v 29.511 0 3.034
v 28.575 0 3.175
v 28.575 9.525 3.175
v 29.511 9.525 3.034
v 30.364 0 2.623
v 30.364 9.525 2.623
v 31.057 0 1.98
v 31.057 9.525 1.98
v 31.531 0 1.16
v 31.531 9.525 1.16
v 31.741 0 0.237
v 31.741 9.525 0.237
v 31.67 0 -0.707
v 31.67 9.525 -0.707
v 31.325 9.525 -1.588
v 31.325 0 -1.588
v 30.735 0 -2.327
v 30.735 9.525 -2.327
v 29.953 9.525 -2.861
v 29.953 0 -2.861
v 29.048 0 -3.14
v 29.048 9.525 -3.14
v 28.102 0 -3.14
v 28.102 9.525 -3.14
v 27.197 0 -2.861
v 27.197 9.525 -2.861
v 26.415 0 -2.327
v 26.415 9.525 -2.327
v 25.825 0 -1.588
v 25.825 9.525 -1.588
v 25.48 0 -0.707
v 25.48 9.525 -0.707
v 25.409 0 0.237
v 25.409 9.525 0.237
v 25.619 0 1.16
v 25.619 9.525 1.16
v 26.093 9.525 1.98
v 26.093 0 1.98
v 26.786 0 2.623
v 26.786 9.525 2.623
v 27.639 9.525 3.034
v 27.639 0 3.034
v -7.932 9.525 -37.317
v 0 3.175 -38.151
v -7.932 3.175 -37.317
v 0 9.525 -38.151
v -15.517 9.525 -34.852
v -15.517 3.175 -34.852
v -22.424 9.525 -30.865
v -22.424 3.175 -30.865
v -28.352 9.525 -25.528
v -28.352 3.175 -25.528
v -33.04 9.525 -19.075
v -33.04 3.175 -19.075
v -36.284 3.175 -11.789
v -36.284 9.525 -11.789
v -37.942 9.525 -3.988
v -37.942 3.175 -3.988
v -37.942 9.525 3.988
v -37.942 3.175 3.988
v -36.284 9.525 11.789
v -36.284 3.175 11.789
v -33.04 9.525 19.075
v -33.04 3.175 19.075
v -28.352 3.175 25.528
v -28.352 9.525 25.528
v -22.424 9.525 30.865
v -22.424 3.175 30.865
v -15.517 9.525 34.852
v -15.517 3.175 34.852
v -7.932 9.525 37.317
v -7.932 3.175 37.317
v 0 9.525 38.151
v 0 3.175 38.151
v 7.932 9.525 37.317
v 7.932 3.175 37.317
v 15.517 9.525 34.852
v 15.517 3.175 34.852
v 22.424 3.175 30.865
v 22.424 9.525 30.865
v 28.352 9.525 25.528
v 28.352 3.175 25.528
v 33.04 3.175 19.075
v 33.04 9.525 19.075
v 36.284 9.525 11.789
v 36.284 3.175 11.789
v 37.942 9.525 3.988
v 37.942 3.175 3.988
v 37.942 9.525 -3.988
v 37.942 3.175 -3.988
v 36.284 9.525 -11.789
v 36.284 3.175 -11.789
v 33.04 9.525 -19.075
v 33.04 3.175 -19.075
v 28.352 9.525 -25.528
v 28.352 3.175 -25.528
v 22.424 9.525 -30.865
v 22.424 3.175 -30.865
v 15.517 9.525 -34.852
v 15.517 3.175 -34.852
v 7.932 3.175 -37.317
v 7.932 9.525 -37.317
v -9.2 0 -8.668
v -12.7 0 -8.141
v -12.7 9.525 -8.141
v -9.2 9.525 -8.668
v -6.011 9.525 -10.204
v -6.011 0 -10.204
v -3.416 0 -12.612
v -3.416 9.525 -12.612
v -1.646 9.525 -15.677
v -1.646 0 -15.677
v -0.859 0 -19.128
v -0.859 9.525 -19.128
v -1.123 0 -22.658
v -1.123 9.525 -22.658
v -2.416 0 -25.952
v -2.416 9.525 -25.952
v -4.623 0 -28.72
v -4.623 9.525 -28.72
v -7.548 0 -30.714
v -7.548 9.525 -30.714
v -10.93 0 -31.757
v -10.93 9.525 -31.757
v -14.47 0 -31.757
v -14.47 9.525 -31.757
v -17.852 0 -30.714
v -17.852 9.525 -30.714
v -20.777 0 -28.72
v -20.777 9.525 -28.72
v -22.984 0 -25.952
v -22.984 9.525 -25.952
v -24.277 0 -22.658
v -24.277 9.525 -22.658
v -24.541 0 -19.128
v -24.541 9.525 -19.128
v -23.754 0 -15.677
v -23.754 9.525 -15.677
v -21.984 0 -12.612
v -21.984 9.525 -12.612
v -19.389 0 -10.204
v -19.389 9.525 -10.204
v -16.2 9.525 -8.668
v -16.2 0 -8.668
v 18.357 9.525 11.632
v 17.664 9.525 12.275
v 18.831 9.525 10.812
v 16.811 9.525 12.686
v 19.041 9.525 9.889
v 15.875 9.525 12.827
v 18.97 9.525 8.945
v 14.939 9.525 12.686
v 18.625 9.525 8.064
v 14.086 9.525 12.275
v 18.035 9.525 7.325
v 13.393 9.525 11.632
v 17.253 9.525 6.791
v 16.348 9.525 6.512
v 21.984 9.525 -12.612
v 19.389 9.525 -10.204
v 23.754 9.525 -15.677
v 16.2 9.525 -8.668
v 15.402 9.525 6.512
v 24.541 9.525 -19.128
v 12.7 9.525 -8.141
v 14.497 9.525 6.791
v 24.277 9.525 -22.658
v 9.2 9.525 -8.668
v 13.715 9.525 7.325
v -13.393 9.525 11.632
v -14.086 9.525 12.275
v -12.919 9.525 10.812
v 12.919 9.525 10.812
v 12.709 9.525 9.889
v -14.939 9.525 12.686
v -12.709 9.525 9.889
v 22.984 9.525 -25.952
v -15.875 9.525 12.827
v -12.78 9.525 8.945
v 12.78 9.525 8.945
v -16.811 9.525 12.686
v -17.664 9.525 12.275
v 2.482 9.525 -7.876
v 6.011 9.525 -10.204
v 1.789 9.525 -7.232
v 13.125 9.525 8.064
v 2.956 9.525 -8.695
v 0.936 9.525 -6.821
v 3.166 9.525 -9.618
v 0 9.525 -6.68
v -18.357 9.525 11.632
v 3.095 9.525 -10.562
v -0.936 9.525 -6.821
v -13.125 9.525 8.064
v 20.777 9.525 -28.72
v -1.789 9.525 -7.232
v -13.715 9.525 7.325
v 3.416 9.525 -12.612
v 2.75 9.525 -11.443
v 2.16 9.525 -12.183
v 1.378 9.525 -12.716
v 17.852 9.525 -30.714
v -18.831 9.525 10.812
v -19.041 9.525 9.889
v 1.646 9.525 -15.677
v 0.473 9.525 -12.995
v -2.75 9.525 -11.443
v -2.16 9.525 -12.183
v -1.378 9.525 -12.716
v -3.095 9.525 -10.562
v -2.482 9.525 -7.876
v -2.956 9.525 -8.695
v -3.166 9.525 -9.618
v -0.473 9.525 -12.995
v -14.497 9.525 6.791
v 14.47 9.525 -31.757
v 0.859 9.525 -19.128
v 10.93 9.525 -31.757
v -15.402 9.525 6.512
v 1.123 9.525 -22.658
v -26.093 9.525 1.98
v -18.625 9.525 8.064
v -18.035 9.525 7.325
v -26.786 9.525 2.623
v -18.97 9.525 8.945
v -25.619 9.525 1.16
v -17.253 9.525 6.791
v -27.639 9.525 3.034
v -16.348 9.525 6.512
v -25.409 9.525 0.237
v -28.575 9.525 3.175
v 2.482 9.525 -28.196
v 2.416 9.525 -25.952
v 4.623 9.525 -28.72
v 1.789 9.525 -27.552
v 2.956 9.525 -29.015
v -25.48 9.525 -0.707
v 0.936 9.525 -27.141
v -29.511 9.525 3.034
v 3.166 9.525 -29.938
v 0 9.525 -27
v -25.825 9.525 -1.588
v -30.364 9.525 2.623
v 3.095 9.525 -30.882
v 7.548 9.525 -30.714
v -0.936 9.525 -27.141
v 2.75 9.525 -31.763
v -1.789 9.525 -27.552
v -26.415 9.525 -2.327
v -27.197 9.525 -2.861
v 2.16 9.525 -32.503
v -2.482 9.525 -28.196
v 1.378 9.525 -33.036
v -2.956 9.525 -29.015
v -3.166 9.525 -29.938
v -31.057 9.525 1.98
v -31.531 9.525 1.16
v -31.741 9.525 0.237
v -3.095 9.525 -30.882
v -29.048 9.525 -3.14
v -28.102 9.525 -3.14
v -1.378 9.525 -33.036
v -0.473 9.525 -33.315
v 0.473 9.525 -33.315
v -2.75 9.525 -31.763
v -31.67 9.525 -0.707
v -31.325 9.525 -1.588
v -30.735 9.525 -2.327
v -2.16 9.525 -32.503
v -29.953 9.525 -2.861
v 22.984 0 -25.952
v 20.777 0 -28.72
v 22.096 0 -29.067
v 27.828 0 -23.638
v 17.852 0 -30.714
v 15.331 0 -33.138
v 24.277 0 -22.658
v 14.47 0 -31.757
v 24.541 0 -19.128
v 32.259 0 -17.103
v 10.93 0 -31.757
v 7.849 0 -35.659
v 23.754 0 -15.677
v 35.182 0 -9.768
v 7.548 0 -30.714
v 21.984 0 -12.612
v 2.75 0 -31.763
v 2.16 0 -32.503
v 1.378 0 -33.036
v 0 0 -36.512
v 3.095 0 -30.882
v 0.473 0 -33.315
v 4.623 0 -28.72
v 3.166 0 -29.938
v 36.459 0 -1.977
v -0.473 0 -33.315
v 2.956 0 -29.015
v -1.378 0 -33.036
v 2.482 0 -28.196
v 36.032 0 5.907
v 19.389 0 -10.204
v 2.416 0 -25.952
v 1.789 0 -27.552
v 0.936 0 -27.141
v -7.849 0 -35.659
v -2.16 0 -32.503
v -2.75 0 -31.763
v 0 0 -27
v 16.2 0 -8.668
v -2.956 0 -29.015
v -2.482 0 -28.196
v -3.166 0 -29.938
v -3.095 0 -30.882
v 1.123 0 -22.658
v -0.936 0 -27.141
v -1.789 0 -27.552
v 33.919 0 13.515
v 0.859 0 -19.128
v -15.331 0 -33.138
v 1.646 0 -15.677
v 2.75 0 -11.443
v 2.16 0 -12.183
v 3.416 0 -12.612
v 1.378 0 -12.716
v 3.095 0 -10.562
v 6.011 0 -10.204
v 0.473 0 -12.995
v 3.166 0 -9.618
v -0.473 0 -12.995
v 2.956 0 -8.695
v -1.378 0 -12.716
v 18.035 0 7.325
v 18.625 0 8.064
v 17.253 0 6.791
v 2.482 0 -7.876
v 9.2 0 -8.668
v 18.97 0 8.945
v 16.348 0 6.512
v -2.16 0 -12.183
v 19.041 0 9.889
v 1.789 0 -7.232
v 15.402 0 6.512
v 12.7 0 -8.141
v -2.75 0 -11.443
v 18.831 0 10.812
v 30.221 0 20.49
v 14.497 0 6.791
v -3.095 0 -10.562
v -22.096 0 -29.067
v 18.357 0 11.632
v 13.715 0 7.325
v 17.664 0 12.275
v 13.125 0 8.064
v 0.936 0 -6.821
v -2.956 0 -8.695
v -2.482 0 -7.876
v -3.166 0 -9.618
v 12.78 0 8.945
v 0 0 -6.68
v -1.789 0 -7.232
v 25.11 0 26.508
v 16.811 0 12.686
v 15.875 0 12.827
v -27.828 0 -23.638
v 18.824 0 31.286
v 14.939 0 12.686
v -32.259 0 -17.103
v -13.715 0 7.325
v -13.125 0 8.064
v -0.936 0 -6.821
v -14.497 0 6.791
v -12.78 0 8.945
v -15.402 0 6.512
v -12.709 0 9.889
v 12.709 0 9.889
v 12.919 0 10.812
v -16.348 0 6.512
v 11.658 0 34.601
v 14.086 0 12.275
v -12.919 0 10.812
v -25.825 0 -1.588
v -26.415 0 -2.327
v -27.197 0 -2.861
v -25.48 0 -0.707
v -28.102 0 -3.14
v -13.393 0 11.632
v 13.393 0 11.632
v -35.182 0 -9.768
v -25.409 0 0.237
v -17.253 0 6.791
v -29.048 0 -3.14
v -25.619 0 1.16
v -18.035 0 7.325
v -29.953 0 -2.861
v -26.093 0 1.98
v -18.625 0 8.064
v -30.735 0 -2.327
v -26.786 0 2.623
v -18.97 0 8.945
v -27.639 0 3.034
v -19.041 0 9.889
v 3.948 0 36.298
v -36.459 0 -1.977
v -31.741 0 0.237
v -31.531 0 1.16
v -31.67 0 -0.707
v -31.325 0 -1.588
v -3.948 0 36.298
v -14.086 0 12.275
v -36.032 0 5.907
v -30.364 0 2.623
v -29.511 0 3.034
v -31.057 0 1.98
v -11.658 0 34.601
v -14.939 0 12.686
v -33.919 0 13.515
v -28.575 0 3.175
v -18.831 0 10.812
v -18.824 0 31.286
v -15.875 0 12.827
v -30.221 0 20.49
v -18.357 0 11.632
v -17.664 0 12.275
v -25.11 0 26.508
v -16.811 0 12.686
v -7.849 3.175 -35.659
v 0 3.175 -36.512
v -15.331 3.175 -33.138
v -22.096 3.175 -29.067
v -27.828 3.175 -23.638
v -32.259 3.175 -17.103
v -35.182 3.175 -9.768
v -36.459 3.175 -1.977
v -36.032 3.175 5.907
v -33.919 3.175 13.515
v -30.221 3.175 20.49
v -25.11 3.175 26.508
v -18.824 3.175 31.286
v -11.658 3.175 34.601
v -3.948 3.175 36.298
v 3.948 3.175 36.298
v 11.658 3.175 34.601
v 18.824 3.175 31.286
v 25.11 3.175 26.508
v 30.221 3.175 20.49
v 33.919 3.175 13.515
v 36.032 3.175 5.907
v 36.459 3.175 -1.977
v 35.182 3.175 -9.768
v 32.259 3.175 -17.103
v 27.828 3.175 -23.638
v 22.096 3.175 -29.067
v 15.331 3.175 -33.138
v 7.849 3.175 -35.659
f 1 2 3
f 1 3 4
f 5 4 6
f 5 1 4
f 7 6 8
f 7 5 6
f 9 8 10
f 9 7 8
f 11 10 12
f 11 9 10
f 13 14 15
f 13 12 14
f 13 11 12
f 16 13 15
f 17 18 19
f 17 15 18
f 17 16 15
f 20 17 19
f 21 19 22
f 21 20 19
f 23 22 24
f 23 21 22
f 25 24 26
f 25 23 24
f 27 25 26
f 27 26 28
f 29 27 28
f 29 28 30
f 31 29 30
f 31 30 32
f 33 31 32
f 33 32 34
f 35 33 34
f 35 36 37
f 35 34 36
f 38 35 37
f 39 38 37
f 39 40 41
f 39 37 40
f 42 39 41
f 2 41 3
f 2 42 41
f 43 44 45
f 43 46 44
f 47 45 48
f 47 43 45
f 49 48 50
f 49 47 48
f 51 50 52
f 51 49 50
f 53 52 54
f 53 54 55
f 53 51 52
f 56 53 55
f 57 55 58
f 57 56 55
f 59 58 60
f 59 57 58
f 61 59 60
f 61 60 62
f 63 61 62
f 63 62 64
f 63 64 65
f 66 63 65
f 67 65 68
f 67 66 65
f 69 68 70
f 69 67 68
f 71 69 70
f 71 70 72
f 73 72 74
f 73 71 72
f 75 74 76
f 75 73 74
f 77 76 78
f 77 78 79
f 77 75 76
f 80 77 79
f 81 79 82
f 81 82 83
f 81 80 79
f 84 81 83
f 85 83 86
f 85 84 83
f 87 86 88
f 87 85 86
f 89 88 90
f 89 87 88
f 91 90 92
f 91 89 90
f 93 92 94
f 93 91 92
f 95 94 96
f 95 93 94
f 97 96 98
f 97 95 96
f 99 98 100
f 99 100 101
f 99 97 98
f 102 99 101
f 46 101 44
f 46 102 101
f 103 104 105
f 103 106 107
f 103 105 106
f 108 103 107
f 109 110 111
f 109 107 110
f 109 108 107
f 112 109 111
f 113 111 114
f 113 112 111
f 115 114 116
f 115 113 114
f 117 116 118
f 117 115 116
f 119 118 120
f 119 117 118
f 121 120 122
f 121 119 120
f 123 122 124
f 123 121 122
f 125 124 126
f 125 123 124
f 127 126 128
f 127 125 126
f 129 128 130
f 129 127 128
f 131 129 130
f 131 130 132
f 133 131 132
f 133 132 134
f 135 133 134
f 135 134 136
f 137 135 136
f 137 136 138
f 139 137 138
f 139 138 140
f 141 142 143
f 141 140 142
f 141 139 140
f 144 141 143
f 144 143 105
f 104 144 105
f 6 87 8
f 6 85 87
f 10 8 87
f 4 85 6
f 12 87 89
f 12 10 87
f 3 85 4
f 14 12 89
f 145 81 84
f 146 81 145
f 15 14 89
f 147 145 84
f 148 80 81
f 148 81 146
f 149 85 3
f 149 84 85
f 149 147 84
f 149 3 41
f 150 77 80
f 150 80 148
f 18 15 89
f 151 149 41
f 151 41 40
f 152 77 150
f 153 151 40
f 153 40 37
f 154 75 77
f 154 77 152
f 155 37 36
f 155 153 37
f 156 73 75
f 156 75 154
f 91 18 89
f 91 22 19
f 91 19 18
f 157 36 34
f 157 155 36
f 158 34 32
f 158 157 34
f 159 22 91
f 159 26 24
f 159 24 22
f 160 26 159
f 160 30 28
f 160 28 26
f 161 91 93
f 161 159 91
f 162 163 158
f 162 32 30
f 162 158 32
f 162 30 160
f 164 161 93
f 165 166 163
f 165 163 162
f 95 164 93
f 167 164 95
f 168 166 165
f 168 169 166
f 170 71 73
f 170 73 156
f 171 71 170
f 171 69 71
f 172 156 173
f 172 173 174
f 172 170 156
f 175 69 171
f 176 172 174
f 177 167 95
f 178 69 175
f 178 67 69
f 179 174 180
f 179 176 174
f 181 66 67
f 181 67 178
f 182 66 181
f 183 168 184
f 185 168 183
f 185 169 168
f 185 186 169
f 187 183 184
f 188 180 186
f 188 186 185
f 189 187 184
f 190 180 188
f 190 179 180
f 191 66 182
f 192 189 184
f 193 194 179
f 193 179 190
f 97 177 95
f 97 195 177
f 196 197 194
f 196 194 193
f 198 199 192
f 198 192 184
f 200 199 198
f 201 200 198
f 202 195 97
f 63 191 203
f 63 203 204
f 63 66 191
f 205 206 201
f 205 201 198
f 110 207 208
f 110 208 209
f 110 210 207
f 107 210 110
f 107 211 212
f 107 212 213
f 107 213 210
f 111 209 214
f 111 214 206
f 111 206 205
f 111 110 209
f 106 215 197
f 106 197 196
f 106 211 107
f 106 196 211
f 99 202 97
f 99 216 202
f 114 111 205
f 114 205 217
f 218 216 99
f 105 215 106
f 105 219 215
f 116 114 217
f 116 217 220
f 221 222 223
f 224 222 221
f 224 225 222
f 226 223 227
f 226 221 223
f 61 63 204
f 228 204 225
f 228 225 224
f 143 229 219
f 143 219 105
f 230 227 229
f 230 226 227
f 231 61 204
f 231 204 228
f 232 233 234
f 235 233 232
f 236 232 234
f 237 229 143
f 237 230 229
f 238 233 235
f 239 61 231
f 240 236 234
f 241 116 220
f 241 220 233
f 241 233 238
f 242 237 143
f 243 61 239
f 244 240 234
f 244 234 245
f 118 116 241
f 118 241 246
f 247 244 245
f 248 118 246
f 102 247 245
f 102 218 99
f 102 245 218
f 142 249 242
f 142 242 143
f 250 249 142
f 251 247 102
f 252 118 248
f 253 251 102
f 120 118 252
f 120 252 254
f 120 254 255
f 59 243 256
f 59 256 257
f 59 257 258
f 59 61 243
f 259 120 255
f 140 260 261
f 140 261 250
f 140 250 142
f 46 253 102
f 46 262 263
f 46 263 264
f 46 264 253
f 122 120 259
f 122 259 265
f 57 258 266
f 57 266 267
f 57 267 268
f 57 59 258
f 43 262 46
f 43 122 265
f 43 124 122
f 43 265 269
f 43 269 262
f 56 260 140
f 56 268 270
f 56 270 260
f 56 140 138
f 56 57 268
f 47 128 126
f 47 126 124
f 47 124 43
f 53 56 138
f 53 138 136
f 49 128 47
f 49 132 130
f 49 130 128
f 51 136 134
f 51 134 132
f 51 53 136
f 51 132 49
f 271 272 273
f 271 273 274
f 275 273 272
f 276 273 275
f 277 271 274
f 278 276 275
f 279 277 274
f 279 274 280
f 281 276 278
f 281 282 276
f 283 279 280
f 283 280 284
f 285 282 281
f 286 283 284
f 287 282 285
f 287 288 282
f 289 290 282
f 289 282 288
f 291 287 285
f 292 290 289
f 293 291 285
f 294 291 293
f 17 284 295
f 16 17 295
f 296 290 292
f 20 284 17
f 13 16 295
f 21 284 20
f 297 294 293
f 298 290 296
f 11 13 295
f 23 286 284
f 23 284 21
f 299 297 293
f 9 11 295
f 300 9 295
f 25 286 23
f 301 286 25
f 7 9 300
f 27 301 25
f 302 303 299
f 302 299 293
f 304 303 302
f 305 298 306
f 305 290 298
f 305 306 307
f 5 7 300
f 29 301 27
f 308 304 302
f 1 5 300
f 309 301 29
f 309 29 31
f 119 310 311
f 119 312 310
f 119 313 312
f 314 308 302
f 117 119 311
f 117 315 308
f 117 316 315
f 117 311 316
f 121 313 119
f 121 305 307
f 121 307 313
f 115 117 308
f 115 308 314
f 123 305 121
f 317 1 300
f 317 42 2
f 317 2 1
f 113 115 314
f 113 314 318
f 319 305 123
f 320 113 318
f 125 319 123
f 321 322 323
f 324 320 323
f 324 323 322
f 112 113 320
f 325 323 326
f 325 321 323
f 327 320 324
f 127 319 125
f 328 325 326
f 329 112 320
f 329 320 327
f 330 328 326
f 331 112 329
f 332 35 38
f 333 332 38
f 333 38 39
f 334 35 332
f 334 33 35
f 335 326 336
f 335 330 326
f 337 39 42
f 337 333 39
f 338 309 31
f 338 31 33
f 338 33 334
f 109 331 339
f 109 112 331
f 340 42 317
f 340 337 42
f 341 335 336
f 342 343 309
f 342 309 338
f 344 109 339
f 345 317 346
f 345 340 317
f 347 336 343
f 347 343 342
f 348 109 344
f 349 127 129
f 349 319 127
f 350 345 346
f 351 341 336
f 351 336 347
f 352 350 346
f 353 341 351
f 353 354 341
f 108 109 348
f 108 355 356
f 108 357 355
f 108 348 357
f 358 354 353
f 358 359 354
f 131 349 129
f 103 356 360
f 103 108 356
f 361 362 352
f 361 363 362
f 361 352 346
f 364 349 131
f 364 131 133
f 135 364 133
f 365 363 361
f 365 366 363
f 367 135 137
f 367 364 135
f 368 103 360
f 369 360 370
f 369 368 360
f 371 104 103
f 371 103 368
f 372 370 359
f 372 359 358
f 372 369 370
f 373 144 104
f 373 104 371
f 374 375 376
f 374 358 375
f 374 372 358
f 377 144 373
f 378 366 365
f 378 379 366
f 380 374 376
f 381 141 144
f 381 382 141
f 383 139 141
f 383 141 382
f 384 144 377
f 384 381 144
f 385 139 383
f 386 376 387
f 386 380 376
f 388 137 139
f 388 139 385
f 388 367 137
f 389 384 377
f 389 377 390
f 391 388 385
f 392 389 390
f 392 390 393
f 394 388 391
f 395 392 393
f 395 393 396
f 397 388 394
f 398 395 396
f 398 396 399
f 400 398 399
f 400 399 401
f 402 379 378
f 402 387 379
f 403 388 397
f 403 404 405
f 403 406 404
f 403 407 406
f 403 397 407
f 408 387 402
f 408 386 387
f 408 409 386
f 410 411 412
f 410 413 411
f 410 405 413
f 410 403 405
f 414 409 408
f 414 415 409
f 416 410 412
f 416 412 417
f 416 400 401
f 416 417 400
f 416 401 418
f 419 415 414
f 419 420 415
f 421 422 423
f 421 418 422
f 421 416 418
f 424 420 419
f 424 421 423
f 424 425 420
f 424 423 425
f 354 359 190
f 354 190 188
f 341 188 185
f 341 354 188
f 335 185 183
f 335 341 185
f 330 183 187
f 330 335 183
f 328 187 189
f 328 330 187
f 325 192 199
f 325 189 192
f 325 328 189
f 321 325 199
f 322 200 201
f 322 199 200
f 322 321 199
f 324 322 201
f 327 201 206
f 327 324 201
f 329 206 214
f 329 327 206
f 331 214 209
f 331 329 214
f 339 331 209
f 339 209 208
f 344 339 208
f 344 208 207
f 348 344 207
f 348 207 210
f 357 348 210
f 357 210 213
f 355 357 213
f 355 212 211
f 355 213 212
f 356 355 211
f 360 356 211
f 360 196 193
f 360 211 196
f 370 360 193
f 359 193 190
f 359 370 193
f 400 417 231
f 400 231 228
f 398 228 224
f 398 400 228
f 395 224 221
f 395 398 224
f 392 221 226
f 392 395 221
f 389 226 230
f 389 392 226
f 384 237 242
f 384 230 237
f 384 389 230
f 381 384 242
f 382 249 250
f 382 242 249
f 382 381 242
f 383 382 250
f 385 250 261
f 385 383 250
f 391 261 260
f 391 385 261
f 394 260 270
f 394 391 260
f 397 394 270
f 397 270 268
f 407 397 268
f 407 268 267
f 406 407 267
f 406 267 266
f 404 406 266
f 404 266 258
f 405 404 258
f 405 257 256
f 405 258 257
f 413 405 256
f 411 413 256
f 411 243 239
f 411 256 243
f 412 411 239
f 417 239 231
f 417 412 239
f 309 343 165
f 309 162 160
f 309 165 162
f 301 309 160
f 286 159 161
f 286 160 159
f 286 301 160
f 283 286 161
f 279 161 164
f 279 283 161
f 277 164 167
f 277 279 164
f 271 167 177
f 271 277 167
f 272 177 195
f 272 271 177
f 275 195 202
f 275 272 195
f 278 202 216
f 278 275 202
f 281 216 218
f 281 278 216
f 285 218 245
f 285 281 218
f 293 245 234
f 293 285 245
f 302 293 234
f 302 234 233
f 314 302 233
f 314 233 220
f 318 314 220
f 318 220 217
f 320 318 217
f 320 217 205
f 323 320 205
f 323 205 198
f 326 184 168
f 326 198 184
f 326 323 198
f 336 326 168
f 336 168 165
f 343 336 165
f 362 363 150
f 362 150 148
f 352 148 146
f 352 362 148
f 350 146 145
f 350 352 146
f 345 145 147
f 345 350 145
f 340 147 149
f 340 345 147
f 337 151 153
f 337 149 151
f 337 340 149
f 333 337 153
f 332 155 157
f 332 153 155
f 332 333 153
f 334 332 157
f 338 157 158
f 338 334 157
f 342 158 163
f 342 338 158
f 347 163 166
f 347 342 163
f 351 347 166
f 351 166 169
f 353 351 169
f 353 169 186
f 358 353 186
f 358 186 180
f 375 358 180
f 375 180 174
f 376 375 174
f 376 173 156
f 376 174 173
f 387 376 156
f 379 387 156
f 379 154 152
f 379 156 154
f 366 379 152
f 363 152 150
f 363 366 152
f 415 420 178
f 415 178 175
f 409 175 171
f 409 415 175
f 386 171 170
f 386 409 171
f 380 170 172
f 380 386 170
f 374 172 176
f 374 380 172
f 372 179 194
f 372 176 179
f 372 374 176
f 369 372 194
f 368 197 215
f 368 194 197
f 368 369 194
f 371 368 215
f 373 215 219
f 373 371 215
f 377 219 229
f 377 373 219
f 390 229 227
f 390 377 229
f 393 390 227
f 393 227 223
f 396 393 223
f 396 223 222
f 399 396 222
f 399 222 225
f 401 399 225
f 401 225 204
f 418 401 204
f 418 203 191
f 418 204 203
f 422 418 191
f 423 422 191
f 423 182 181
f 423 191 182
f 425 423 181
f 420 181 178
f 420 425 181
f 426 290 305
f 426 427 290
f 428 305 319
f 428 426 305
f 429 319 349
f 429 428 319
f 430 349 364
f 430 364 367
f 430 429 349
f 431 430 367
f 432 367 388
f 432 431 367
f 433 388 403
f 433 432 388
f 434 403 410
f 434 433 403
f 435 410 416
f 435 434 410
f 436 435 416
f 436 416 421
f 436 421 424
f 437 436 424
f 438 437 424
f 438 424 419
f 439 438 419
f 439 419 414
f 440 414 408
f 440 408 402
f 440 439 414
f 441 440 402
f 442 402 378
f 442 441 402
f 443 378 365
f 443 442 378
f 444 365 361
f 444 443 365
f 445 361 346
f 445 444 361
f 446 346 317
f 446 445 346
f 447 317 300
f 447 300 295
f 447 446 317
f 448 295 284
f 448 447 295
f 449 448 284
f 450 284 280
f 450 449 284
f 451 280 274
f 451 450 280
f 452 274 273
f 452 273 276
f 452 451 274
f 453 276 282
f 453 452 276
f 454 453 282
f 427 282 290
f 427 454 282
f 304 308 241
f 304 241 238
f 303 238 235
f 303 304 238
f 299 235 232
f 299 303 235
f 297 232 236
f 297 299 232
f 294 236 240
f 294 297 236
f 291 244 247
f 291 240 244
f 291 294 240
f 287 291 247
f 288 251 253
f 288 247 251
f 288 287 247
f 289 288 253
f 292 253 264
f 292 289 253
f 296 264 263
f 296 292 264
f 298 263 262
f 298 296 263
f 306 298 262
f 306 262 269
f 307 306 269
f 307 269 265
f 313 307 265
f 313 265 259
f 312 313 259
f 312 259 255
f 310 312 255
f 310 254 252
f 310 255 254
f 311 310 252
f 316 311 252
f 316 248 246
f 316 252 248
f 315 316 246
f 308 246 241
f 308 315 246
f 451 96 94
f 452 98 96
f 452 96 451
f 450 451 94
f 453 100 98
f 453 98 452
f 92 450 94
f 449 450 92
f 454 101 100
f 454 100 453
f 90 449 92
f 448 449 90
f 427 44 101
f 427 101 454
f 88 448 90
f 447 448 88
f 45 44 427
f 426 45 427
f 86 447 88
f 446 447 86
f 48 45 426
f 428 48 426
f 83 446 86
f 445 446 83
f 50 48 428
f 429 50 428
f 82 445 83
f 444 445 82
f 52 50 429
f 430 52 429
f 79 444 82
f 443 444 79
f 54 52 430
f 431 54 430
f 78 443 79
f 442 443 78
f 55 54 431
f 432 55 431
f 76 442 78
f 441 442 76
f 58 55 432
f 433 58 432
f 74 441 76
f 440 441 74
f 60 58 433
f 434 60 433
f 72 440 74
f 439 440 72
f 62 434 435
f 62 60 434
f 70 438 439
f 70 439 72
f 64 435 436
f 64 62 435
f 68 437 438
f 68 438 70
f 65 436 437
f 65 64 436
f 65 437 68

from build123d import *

# Parameters (mm, degrees)
CUT_EXTRUDE1_DEPTH      = 55.787705795
CUT_EXTRUDE1_DEPTH_BACK = 55.787705795
SKETCH2_R               = 11.8745
SKETCH2_R_2             = 3.175
CUT_EXTRUDE2_DEPTH      = 55.787705795
CUT_EXTRUDE2_DEPTH_BACK = 55.787705795
SKETCH3_R               = 3.175
CUT_EXTRUDE3_DEPTH      = 55.787705795
CUT_EXTRUDE3_DEPTH_BACK = 55.787705795
SKETCH4_R               = 3.175


with BuildPart() as part:
    # Sketch1 → Revolve1 (revolve)
    with BuildSketch(Plane.XY):
        Polygon((0, 0), (36.5125, 0), (36.5125, 3.175), (38.1508, 3.175), (38.1508, 9.525), (0, 9.525), align=None)
    revolve(axis=Axis((0, 0, 0), (0, 1, 0)))

    # Sketch2 → Cut-Extrude1 (cut, two sides: drawn at the far end of the back side and taken through both)
    with BuildSketch(Plane(origin=(0, 9.525, 0), x_dir=(1, 0, 0), z_dir=(0, 1, 0)).offset(-CUT_EXTRUDE1_DEPTH_BACK)):
        with Locations((-12.7, 20.0152)):
            Circle(SKETCH2_R)
        with Locations((12.7, 20.0152)):
            Circle(SKETCH2_R)
        with Locations((0, 30.1752)):
            Circle(SKETCH2_R_2)
        with Locations((0, 9.8552)):
            Circle(SKETCH2_R_2)
    extrude(amount=CUT_EXTRUDE1_DEPTH + CUT_EXTRUDE1_DEPTH_BACK, mode=Mode.SUBTRACT)

    # Sketch3 → Cut-Extrude2 (cut, two sides: drawn at the far end of the back side and taken through both)
    with BuildSketch(Plane(origin=(0, 9.525, 0), x_dir=(1, 0, 0), z_dir=(0, 1, 0)).offset(-CUT_EXTRUDE2_DEPTH_BACK)):
        with Locations((-28.575, 0)):
            Circle(SKETCH3_R)
        with Locations((28.575, 0)):
            Circle(SKETCH3_R)
    extrude(amount=CUT_EXTRUDE2_DEPTH + CUT_EXTRUDE2_DEPTH_BACK, mode=Mode.SUBTRACT)

    # Sketch4 → Cut-Extrude3 (cut, two sides: drawn at the far end of the back side and taken through both)
    with BuildSketch(Plane(origin=(0, 9.525, 0), x_dir=(1, 0, 0), z_dir=(0, 1, 0)).offset(-CUT_EXTRUDE3_DEPTH_BACK)):
        with Locations((-15.875, -9.652)):
            Circle(SKETCH4_R)
        with Locations((15.875, -9.652)):
            Circle(SKETCH4_R)
    extrude(amount=CUT_EXTRUDE3_DEPTH + CUT_EXTRUDE3_DEPTH_BACK, mode=Mode.SUBTRACT)


solid = part.part
